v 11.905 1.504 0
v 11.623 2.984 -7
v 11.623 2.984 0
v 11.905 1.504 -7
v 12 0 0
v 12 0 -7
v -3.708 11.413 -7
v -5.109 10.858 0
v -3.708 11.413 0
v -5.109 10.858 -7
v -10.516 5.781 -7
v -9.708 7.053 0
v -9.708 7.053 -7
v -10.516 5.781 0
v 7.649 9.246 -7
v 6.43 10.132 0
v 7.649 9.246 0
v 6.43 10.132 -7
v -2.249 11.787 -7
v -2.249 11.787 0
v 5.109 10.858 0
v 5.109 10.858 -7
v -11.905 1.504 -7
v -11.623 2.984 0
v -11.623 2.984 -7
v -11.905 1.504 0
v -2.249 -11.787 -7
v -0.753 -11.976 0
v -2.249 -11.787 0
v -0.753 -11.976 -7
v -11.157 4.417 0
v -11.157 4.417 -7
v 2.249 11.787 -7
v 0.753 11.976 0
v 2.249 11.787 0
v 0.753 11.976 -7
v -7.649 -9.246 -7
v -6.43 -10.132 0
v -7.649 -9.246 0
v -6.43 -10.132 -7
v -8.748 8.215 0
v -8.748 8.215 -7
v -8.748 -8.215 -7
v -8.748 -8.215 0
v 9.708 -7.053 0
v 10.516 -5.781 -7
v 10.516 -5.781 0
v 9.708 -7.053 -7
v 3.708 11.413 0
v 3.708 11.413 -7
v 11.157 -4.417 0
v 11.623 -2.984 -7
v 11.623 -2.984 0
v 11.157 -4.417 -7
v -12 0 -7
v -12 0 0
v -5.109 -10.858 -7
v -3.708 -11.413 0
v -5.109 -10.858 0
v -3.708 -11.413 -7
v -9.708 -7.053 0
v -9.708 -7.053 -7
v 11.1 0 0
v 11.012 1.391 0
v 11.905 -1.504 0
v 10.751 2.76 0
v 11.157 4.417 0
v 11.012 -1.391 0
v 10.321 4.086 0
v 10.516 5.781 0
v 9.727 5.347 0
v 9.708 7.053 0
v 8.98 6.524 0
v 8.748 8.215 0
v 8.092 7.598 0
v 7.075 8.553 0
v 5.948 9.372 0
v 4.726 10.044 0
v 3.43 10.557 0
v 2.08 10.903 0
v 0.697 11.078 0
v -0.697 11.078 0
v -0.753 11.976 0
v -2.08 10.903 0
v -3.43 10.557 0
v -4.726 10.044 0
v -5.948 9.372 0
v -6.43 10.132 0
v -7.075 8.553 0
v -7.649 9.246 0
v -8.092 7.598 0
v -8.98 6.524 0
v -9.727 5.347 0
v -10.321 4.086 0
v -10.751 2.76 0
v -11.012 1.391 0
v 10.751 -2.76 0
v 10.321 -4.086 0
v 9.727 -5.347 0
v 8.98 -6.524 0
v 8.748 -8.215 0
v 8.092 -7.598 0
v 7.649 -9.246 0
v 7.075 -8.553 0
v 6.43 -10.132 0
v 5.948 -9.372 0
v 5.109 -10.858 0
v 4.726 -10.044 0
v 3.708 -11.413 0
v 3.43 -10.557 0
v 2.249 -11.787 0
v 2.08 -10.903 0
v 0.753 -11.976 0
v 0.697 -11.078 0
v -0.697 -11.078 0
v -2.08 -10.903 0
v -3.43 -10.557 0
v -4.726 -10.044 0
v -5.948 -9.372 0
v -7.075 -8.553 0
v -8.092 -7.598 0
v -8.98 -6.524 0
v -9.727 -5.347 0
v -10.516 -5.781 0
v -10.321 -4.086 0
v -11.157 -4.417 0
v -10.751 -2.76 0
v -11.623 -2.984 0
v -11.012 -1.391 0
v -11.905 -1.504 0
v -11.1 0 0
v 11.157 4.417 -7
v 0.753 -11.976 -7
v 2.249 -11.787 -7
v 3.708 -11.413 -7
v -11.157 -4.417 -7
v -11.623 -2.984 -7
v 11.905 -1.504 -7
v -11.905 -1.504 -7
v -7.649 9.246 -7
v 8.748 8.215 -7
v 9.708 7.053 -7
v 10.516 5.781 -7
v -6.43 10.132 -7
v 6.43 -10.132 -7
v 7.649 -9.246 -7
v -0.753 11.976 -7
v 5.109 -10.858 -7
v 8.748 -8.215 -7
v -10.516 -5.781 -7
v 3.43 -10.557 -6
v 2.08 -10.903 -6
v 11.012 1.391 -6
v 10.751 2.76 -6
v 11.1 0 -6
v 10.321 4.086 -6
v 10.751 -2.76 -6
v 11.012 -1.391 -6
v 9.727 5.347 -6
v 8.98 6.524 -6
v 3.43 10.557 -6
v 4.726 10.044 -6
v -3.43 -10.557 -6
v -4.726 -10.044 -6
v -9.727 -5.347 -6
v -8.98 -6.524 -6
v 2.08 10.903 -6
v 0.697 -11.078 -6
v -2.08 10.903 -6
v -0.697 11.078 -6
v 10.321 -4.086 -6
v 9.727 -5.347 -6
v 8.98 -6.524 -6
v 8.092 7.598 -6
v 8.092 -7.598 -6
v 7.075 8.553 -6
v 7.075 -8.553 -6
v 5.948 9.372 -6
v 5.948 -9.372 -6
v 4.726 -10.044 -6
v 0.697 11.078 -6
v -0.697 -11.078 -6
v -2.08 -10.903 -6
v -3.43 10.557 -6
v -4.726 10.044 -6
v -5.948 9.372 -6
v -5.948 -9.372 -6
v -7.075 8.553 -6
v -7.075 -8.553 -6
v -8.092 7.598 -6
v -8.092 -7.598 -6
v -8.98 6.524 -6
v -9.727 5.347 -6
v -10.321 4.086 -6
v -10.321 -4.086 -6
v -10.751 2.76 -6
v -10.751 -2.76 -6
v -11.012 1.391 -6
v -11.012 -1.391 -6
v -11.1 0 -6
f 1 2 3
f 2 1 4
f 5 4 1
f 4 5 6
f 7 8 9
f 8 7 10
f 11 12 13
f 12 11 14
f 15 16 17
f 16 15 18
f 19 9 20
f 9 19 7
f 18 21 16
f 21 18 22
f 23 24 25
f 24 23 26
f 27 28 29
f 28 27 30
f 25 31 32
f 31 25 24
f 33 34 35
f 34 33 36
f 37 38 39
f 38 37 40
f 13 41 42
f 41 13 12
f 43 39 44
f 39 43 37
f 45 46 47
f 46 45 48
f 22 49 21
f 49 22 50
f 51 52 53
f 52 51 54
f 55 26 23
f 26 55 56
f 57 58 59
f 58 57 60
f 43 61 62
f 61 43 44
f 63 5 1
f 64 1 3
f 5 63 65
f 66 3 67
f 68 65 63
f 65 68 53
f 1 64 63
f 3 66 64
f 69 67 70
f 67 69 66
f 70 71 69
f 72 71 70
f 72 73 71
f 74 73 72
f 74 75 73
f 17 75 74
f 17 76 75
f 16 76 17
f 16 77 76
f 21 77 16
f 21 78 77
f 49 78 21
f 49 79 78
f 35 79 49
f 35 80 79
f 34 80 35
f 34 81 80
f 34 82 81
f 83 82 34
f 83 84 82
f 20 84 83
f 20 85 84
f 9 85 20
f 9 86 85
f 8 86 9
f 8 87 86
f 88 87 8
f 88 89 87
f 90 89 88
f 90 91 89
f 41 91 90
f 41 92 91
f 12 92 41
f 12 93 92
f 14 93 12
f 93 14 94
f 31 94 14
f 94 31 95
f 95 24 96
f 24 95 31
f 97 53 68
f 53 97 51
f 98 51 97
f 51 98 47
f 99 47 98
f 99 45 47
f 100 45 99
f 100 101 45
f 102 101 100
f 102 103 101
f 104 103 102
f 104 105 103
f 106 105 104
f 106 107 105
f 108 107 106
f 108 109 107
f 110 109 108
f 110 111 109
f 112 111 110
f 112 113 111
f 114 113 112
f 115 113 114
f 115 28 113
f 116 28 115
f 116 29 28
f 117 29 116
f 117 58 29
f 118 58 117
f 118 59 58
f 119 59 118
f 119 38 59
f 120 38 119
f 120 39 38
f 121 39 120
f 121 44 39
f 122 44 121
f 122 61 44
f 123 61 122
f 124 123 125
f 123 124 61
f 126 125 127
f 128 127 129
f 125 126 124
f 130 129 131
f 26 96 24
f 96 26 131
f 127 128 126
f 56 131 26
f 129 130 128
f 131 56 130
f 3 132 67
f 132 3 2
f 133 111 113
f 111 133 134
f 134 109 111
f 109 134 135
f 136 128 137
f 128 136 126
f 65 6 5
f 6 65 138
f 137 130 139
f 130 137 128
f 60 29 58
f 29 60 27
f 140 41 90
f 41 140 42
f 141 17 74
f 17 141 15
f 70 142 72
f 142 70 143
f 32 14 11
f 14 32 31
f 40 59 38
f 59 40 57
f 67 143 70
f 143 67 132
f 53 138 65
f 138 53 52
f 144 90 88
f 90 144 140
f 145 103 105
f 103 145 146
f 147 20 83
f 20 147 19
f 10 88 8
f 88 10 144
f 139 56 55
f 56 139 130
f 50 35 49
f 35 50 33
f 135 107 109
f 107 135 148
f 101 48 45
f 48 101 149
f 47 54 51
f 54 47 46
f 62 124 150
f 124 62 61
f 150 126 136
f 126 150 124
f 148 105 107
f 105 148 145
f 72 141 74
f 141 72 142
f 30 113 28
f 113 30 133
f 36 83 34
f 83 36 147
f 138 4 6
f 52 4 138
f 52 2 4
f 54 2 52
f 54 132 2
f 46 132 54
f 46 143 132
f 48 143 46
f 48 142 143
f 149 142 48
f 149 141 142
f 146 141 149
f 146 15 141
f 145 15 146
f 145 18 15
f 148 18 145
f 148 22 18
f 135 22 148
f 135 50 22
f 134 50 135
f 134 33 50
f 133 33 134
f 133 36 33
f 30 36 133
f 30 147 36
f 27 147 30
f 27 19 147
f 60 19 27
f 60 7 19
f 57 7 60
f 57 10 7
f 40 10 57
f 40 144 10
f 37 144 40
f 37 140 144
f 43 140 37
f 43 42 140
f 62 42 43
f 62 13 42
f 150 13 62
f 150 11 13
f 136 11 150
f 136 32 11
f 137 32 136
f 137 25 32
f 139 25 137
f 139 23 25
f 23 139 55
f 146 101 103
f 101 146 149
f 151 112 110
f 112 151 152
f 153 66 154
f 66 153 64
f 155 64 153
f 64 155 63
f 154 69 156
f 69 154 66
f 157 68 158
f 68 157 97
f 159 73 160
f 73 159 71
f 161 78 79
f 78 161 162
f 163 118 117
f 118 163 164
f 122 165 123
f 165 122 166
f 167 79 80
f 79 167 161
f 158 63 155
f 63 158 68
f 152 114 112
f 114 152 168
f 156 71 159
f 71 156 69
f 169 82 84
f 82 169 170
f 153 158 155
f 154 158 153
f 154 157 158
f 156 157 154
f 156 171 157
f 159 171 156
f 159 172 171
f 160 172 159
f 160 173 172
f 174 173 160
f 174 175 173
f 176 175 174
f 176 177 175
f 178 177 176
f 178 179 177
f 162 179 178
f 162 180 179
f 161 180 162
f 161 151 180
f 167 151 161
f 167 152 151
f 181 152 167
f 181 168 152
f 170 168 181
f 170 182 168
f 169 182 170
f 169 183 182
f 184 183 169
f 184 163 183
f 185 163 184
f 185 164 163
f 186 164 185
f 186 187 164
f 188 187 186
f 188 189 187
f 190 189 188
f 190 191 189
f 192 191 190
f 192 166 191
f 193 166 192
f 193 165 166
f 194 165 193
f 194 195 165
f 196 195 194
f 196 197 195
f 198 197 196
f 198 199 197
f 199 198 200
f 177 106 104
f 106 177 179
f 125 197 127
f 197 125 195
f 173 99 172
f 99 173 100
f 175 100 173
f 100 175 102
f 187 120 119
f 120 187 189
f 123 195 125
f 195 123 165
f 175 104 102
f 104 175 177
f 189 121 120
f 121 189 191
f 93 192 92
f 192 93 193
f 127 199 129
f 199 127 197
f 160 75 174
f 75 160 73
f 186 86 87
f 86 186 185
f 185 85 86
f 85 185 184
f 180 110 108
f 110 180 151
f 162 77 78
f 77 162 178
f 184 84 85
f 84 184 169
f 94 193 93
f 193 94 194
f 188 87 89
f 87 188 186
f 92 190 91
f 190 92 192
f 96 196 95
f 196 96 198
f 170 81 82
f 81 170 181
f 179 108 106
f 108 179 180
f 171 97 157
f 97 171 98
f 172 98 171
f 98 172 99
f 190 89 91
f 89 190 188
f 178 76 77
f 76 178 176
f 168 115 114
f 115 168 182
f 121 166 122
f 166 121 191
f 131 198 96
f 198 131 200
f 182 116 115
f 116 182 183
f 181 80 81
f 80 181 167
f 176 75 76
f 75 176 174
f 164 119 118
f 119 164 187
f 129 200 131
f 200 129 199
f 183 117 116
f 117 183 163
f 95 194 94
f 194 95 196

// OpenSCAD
$fn = 50;


difference() {
	union() {
		translate(v = [0, 0, -7.0000000000]) {
			cylinder(h = 7, r = 12.0000000000);
		}
	}
	union() {
		#translate(v = [0, 0, -6.0000000000]) {
			cylinder(h = 6, r = 11.1000000000);
		}
	}
}
